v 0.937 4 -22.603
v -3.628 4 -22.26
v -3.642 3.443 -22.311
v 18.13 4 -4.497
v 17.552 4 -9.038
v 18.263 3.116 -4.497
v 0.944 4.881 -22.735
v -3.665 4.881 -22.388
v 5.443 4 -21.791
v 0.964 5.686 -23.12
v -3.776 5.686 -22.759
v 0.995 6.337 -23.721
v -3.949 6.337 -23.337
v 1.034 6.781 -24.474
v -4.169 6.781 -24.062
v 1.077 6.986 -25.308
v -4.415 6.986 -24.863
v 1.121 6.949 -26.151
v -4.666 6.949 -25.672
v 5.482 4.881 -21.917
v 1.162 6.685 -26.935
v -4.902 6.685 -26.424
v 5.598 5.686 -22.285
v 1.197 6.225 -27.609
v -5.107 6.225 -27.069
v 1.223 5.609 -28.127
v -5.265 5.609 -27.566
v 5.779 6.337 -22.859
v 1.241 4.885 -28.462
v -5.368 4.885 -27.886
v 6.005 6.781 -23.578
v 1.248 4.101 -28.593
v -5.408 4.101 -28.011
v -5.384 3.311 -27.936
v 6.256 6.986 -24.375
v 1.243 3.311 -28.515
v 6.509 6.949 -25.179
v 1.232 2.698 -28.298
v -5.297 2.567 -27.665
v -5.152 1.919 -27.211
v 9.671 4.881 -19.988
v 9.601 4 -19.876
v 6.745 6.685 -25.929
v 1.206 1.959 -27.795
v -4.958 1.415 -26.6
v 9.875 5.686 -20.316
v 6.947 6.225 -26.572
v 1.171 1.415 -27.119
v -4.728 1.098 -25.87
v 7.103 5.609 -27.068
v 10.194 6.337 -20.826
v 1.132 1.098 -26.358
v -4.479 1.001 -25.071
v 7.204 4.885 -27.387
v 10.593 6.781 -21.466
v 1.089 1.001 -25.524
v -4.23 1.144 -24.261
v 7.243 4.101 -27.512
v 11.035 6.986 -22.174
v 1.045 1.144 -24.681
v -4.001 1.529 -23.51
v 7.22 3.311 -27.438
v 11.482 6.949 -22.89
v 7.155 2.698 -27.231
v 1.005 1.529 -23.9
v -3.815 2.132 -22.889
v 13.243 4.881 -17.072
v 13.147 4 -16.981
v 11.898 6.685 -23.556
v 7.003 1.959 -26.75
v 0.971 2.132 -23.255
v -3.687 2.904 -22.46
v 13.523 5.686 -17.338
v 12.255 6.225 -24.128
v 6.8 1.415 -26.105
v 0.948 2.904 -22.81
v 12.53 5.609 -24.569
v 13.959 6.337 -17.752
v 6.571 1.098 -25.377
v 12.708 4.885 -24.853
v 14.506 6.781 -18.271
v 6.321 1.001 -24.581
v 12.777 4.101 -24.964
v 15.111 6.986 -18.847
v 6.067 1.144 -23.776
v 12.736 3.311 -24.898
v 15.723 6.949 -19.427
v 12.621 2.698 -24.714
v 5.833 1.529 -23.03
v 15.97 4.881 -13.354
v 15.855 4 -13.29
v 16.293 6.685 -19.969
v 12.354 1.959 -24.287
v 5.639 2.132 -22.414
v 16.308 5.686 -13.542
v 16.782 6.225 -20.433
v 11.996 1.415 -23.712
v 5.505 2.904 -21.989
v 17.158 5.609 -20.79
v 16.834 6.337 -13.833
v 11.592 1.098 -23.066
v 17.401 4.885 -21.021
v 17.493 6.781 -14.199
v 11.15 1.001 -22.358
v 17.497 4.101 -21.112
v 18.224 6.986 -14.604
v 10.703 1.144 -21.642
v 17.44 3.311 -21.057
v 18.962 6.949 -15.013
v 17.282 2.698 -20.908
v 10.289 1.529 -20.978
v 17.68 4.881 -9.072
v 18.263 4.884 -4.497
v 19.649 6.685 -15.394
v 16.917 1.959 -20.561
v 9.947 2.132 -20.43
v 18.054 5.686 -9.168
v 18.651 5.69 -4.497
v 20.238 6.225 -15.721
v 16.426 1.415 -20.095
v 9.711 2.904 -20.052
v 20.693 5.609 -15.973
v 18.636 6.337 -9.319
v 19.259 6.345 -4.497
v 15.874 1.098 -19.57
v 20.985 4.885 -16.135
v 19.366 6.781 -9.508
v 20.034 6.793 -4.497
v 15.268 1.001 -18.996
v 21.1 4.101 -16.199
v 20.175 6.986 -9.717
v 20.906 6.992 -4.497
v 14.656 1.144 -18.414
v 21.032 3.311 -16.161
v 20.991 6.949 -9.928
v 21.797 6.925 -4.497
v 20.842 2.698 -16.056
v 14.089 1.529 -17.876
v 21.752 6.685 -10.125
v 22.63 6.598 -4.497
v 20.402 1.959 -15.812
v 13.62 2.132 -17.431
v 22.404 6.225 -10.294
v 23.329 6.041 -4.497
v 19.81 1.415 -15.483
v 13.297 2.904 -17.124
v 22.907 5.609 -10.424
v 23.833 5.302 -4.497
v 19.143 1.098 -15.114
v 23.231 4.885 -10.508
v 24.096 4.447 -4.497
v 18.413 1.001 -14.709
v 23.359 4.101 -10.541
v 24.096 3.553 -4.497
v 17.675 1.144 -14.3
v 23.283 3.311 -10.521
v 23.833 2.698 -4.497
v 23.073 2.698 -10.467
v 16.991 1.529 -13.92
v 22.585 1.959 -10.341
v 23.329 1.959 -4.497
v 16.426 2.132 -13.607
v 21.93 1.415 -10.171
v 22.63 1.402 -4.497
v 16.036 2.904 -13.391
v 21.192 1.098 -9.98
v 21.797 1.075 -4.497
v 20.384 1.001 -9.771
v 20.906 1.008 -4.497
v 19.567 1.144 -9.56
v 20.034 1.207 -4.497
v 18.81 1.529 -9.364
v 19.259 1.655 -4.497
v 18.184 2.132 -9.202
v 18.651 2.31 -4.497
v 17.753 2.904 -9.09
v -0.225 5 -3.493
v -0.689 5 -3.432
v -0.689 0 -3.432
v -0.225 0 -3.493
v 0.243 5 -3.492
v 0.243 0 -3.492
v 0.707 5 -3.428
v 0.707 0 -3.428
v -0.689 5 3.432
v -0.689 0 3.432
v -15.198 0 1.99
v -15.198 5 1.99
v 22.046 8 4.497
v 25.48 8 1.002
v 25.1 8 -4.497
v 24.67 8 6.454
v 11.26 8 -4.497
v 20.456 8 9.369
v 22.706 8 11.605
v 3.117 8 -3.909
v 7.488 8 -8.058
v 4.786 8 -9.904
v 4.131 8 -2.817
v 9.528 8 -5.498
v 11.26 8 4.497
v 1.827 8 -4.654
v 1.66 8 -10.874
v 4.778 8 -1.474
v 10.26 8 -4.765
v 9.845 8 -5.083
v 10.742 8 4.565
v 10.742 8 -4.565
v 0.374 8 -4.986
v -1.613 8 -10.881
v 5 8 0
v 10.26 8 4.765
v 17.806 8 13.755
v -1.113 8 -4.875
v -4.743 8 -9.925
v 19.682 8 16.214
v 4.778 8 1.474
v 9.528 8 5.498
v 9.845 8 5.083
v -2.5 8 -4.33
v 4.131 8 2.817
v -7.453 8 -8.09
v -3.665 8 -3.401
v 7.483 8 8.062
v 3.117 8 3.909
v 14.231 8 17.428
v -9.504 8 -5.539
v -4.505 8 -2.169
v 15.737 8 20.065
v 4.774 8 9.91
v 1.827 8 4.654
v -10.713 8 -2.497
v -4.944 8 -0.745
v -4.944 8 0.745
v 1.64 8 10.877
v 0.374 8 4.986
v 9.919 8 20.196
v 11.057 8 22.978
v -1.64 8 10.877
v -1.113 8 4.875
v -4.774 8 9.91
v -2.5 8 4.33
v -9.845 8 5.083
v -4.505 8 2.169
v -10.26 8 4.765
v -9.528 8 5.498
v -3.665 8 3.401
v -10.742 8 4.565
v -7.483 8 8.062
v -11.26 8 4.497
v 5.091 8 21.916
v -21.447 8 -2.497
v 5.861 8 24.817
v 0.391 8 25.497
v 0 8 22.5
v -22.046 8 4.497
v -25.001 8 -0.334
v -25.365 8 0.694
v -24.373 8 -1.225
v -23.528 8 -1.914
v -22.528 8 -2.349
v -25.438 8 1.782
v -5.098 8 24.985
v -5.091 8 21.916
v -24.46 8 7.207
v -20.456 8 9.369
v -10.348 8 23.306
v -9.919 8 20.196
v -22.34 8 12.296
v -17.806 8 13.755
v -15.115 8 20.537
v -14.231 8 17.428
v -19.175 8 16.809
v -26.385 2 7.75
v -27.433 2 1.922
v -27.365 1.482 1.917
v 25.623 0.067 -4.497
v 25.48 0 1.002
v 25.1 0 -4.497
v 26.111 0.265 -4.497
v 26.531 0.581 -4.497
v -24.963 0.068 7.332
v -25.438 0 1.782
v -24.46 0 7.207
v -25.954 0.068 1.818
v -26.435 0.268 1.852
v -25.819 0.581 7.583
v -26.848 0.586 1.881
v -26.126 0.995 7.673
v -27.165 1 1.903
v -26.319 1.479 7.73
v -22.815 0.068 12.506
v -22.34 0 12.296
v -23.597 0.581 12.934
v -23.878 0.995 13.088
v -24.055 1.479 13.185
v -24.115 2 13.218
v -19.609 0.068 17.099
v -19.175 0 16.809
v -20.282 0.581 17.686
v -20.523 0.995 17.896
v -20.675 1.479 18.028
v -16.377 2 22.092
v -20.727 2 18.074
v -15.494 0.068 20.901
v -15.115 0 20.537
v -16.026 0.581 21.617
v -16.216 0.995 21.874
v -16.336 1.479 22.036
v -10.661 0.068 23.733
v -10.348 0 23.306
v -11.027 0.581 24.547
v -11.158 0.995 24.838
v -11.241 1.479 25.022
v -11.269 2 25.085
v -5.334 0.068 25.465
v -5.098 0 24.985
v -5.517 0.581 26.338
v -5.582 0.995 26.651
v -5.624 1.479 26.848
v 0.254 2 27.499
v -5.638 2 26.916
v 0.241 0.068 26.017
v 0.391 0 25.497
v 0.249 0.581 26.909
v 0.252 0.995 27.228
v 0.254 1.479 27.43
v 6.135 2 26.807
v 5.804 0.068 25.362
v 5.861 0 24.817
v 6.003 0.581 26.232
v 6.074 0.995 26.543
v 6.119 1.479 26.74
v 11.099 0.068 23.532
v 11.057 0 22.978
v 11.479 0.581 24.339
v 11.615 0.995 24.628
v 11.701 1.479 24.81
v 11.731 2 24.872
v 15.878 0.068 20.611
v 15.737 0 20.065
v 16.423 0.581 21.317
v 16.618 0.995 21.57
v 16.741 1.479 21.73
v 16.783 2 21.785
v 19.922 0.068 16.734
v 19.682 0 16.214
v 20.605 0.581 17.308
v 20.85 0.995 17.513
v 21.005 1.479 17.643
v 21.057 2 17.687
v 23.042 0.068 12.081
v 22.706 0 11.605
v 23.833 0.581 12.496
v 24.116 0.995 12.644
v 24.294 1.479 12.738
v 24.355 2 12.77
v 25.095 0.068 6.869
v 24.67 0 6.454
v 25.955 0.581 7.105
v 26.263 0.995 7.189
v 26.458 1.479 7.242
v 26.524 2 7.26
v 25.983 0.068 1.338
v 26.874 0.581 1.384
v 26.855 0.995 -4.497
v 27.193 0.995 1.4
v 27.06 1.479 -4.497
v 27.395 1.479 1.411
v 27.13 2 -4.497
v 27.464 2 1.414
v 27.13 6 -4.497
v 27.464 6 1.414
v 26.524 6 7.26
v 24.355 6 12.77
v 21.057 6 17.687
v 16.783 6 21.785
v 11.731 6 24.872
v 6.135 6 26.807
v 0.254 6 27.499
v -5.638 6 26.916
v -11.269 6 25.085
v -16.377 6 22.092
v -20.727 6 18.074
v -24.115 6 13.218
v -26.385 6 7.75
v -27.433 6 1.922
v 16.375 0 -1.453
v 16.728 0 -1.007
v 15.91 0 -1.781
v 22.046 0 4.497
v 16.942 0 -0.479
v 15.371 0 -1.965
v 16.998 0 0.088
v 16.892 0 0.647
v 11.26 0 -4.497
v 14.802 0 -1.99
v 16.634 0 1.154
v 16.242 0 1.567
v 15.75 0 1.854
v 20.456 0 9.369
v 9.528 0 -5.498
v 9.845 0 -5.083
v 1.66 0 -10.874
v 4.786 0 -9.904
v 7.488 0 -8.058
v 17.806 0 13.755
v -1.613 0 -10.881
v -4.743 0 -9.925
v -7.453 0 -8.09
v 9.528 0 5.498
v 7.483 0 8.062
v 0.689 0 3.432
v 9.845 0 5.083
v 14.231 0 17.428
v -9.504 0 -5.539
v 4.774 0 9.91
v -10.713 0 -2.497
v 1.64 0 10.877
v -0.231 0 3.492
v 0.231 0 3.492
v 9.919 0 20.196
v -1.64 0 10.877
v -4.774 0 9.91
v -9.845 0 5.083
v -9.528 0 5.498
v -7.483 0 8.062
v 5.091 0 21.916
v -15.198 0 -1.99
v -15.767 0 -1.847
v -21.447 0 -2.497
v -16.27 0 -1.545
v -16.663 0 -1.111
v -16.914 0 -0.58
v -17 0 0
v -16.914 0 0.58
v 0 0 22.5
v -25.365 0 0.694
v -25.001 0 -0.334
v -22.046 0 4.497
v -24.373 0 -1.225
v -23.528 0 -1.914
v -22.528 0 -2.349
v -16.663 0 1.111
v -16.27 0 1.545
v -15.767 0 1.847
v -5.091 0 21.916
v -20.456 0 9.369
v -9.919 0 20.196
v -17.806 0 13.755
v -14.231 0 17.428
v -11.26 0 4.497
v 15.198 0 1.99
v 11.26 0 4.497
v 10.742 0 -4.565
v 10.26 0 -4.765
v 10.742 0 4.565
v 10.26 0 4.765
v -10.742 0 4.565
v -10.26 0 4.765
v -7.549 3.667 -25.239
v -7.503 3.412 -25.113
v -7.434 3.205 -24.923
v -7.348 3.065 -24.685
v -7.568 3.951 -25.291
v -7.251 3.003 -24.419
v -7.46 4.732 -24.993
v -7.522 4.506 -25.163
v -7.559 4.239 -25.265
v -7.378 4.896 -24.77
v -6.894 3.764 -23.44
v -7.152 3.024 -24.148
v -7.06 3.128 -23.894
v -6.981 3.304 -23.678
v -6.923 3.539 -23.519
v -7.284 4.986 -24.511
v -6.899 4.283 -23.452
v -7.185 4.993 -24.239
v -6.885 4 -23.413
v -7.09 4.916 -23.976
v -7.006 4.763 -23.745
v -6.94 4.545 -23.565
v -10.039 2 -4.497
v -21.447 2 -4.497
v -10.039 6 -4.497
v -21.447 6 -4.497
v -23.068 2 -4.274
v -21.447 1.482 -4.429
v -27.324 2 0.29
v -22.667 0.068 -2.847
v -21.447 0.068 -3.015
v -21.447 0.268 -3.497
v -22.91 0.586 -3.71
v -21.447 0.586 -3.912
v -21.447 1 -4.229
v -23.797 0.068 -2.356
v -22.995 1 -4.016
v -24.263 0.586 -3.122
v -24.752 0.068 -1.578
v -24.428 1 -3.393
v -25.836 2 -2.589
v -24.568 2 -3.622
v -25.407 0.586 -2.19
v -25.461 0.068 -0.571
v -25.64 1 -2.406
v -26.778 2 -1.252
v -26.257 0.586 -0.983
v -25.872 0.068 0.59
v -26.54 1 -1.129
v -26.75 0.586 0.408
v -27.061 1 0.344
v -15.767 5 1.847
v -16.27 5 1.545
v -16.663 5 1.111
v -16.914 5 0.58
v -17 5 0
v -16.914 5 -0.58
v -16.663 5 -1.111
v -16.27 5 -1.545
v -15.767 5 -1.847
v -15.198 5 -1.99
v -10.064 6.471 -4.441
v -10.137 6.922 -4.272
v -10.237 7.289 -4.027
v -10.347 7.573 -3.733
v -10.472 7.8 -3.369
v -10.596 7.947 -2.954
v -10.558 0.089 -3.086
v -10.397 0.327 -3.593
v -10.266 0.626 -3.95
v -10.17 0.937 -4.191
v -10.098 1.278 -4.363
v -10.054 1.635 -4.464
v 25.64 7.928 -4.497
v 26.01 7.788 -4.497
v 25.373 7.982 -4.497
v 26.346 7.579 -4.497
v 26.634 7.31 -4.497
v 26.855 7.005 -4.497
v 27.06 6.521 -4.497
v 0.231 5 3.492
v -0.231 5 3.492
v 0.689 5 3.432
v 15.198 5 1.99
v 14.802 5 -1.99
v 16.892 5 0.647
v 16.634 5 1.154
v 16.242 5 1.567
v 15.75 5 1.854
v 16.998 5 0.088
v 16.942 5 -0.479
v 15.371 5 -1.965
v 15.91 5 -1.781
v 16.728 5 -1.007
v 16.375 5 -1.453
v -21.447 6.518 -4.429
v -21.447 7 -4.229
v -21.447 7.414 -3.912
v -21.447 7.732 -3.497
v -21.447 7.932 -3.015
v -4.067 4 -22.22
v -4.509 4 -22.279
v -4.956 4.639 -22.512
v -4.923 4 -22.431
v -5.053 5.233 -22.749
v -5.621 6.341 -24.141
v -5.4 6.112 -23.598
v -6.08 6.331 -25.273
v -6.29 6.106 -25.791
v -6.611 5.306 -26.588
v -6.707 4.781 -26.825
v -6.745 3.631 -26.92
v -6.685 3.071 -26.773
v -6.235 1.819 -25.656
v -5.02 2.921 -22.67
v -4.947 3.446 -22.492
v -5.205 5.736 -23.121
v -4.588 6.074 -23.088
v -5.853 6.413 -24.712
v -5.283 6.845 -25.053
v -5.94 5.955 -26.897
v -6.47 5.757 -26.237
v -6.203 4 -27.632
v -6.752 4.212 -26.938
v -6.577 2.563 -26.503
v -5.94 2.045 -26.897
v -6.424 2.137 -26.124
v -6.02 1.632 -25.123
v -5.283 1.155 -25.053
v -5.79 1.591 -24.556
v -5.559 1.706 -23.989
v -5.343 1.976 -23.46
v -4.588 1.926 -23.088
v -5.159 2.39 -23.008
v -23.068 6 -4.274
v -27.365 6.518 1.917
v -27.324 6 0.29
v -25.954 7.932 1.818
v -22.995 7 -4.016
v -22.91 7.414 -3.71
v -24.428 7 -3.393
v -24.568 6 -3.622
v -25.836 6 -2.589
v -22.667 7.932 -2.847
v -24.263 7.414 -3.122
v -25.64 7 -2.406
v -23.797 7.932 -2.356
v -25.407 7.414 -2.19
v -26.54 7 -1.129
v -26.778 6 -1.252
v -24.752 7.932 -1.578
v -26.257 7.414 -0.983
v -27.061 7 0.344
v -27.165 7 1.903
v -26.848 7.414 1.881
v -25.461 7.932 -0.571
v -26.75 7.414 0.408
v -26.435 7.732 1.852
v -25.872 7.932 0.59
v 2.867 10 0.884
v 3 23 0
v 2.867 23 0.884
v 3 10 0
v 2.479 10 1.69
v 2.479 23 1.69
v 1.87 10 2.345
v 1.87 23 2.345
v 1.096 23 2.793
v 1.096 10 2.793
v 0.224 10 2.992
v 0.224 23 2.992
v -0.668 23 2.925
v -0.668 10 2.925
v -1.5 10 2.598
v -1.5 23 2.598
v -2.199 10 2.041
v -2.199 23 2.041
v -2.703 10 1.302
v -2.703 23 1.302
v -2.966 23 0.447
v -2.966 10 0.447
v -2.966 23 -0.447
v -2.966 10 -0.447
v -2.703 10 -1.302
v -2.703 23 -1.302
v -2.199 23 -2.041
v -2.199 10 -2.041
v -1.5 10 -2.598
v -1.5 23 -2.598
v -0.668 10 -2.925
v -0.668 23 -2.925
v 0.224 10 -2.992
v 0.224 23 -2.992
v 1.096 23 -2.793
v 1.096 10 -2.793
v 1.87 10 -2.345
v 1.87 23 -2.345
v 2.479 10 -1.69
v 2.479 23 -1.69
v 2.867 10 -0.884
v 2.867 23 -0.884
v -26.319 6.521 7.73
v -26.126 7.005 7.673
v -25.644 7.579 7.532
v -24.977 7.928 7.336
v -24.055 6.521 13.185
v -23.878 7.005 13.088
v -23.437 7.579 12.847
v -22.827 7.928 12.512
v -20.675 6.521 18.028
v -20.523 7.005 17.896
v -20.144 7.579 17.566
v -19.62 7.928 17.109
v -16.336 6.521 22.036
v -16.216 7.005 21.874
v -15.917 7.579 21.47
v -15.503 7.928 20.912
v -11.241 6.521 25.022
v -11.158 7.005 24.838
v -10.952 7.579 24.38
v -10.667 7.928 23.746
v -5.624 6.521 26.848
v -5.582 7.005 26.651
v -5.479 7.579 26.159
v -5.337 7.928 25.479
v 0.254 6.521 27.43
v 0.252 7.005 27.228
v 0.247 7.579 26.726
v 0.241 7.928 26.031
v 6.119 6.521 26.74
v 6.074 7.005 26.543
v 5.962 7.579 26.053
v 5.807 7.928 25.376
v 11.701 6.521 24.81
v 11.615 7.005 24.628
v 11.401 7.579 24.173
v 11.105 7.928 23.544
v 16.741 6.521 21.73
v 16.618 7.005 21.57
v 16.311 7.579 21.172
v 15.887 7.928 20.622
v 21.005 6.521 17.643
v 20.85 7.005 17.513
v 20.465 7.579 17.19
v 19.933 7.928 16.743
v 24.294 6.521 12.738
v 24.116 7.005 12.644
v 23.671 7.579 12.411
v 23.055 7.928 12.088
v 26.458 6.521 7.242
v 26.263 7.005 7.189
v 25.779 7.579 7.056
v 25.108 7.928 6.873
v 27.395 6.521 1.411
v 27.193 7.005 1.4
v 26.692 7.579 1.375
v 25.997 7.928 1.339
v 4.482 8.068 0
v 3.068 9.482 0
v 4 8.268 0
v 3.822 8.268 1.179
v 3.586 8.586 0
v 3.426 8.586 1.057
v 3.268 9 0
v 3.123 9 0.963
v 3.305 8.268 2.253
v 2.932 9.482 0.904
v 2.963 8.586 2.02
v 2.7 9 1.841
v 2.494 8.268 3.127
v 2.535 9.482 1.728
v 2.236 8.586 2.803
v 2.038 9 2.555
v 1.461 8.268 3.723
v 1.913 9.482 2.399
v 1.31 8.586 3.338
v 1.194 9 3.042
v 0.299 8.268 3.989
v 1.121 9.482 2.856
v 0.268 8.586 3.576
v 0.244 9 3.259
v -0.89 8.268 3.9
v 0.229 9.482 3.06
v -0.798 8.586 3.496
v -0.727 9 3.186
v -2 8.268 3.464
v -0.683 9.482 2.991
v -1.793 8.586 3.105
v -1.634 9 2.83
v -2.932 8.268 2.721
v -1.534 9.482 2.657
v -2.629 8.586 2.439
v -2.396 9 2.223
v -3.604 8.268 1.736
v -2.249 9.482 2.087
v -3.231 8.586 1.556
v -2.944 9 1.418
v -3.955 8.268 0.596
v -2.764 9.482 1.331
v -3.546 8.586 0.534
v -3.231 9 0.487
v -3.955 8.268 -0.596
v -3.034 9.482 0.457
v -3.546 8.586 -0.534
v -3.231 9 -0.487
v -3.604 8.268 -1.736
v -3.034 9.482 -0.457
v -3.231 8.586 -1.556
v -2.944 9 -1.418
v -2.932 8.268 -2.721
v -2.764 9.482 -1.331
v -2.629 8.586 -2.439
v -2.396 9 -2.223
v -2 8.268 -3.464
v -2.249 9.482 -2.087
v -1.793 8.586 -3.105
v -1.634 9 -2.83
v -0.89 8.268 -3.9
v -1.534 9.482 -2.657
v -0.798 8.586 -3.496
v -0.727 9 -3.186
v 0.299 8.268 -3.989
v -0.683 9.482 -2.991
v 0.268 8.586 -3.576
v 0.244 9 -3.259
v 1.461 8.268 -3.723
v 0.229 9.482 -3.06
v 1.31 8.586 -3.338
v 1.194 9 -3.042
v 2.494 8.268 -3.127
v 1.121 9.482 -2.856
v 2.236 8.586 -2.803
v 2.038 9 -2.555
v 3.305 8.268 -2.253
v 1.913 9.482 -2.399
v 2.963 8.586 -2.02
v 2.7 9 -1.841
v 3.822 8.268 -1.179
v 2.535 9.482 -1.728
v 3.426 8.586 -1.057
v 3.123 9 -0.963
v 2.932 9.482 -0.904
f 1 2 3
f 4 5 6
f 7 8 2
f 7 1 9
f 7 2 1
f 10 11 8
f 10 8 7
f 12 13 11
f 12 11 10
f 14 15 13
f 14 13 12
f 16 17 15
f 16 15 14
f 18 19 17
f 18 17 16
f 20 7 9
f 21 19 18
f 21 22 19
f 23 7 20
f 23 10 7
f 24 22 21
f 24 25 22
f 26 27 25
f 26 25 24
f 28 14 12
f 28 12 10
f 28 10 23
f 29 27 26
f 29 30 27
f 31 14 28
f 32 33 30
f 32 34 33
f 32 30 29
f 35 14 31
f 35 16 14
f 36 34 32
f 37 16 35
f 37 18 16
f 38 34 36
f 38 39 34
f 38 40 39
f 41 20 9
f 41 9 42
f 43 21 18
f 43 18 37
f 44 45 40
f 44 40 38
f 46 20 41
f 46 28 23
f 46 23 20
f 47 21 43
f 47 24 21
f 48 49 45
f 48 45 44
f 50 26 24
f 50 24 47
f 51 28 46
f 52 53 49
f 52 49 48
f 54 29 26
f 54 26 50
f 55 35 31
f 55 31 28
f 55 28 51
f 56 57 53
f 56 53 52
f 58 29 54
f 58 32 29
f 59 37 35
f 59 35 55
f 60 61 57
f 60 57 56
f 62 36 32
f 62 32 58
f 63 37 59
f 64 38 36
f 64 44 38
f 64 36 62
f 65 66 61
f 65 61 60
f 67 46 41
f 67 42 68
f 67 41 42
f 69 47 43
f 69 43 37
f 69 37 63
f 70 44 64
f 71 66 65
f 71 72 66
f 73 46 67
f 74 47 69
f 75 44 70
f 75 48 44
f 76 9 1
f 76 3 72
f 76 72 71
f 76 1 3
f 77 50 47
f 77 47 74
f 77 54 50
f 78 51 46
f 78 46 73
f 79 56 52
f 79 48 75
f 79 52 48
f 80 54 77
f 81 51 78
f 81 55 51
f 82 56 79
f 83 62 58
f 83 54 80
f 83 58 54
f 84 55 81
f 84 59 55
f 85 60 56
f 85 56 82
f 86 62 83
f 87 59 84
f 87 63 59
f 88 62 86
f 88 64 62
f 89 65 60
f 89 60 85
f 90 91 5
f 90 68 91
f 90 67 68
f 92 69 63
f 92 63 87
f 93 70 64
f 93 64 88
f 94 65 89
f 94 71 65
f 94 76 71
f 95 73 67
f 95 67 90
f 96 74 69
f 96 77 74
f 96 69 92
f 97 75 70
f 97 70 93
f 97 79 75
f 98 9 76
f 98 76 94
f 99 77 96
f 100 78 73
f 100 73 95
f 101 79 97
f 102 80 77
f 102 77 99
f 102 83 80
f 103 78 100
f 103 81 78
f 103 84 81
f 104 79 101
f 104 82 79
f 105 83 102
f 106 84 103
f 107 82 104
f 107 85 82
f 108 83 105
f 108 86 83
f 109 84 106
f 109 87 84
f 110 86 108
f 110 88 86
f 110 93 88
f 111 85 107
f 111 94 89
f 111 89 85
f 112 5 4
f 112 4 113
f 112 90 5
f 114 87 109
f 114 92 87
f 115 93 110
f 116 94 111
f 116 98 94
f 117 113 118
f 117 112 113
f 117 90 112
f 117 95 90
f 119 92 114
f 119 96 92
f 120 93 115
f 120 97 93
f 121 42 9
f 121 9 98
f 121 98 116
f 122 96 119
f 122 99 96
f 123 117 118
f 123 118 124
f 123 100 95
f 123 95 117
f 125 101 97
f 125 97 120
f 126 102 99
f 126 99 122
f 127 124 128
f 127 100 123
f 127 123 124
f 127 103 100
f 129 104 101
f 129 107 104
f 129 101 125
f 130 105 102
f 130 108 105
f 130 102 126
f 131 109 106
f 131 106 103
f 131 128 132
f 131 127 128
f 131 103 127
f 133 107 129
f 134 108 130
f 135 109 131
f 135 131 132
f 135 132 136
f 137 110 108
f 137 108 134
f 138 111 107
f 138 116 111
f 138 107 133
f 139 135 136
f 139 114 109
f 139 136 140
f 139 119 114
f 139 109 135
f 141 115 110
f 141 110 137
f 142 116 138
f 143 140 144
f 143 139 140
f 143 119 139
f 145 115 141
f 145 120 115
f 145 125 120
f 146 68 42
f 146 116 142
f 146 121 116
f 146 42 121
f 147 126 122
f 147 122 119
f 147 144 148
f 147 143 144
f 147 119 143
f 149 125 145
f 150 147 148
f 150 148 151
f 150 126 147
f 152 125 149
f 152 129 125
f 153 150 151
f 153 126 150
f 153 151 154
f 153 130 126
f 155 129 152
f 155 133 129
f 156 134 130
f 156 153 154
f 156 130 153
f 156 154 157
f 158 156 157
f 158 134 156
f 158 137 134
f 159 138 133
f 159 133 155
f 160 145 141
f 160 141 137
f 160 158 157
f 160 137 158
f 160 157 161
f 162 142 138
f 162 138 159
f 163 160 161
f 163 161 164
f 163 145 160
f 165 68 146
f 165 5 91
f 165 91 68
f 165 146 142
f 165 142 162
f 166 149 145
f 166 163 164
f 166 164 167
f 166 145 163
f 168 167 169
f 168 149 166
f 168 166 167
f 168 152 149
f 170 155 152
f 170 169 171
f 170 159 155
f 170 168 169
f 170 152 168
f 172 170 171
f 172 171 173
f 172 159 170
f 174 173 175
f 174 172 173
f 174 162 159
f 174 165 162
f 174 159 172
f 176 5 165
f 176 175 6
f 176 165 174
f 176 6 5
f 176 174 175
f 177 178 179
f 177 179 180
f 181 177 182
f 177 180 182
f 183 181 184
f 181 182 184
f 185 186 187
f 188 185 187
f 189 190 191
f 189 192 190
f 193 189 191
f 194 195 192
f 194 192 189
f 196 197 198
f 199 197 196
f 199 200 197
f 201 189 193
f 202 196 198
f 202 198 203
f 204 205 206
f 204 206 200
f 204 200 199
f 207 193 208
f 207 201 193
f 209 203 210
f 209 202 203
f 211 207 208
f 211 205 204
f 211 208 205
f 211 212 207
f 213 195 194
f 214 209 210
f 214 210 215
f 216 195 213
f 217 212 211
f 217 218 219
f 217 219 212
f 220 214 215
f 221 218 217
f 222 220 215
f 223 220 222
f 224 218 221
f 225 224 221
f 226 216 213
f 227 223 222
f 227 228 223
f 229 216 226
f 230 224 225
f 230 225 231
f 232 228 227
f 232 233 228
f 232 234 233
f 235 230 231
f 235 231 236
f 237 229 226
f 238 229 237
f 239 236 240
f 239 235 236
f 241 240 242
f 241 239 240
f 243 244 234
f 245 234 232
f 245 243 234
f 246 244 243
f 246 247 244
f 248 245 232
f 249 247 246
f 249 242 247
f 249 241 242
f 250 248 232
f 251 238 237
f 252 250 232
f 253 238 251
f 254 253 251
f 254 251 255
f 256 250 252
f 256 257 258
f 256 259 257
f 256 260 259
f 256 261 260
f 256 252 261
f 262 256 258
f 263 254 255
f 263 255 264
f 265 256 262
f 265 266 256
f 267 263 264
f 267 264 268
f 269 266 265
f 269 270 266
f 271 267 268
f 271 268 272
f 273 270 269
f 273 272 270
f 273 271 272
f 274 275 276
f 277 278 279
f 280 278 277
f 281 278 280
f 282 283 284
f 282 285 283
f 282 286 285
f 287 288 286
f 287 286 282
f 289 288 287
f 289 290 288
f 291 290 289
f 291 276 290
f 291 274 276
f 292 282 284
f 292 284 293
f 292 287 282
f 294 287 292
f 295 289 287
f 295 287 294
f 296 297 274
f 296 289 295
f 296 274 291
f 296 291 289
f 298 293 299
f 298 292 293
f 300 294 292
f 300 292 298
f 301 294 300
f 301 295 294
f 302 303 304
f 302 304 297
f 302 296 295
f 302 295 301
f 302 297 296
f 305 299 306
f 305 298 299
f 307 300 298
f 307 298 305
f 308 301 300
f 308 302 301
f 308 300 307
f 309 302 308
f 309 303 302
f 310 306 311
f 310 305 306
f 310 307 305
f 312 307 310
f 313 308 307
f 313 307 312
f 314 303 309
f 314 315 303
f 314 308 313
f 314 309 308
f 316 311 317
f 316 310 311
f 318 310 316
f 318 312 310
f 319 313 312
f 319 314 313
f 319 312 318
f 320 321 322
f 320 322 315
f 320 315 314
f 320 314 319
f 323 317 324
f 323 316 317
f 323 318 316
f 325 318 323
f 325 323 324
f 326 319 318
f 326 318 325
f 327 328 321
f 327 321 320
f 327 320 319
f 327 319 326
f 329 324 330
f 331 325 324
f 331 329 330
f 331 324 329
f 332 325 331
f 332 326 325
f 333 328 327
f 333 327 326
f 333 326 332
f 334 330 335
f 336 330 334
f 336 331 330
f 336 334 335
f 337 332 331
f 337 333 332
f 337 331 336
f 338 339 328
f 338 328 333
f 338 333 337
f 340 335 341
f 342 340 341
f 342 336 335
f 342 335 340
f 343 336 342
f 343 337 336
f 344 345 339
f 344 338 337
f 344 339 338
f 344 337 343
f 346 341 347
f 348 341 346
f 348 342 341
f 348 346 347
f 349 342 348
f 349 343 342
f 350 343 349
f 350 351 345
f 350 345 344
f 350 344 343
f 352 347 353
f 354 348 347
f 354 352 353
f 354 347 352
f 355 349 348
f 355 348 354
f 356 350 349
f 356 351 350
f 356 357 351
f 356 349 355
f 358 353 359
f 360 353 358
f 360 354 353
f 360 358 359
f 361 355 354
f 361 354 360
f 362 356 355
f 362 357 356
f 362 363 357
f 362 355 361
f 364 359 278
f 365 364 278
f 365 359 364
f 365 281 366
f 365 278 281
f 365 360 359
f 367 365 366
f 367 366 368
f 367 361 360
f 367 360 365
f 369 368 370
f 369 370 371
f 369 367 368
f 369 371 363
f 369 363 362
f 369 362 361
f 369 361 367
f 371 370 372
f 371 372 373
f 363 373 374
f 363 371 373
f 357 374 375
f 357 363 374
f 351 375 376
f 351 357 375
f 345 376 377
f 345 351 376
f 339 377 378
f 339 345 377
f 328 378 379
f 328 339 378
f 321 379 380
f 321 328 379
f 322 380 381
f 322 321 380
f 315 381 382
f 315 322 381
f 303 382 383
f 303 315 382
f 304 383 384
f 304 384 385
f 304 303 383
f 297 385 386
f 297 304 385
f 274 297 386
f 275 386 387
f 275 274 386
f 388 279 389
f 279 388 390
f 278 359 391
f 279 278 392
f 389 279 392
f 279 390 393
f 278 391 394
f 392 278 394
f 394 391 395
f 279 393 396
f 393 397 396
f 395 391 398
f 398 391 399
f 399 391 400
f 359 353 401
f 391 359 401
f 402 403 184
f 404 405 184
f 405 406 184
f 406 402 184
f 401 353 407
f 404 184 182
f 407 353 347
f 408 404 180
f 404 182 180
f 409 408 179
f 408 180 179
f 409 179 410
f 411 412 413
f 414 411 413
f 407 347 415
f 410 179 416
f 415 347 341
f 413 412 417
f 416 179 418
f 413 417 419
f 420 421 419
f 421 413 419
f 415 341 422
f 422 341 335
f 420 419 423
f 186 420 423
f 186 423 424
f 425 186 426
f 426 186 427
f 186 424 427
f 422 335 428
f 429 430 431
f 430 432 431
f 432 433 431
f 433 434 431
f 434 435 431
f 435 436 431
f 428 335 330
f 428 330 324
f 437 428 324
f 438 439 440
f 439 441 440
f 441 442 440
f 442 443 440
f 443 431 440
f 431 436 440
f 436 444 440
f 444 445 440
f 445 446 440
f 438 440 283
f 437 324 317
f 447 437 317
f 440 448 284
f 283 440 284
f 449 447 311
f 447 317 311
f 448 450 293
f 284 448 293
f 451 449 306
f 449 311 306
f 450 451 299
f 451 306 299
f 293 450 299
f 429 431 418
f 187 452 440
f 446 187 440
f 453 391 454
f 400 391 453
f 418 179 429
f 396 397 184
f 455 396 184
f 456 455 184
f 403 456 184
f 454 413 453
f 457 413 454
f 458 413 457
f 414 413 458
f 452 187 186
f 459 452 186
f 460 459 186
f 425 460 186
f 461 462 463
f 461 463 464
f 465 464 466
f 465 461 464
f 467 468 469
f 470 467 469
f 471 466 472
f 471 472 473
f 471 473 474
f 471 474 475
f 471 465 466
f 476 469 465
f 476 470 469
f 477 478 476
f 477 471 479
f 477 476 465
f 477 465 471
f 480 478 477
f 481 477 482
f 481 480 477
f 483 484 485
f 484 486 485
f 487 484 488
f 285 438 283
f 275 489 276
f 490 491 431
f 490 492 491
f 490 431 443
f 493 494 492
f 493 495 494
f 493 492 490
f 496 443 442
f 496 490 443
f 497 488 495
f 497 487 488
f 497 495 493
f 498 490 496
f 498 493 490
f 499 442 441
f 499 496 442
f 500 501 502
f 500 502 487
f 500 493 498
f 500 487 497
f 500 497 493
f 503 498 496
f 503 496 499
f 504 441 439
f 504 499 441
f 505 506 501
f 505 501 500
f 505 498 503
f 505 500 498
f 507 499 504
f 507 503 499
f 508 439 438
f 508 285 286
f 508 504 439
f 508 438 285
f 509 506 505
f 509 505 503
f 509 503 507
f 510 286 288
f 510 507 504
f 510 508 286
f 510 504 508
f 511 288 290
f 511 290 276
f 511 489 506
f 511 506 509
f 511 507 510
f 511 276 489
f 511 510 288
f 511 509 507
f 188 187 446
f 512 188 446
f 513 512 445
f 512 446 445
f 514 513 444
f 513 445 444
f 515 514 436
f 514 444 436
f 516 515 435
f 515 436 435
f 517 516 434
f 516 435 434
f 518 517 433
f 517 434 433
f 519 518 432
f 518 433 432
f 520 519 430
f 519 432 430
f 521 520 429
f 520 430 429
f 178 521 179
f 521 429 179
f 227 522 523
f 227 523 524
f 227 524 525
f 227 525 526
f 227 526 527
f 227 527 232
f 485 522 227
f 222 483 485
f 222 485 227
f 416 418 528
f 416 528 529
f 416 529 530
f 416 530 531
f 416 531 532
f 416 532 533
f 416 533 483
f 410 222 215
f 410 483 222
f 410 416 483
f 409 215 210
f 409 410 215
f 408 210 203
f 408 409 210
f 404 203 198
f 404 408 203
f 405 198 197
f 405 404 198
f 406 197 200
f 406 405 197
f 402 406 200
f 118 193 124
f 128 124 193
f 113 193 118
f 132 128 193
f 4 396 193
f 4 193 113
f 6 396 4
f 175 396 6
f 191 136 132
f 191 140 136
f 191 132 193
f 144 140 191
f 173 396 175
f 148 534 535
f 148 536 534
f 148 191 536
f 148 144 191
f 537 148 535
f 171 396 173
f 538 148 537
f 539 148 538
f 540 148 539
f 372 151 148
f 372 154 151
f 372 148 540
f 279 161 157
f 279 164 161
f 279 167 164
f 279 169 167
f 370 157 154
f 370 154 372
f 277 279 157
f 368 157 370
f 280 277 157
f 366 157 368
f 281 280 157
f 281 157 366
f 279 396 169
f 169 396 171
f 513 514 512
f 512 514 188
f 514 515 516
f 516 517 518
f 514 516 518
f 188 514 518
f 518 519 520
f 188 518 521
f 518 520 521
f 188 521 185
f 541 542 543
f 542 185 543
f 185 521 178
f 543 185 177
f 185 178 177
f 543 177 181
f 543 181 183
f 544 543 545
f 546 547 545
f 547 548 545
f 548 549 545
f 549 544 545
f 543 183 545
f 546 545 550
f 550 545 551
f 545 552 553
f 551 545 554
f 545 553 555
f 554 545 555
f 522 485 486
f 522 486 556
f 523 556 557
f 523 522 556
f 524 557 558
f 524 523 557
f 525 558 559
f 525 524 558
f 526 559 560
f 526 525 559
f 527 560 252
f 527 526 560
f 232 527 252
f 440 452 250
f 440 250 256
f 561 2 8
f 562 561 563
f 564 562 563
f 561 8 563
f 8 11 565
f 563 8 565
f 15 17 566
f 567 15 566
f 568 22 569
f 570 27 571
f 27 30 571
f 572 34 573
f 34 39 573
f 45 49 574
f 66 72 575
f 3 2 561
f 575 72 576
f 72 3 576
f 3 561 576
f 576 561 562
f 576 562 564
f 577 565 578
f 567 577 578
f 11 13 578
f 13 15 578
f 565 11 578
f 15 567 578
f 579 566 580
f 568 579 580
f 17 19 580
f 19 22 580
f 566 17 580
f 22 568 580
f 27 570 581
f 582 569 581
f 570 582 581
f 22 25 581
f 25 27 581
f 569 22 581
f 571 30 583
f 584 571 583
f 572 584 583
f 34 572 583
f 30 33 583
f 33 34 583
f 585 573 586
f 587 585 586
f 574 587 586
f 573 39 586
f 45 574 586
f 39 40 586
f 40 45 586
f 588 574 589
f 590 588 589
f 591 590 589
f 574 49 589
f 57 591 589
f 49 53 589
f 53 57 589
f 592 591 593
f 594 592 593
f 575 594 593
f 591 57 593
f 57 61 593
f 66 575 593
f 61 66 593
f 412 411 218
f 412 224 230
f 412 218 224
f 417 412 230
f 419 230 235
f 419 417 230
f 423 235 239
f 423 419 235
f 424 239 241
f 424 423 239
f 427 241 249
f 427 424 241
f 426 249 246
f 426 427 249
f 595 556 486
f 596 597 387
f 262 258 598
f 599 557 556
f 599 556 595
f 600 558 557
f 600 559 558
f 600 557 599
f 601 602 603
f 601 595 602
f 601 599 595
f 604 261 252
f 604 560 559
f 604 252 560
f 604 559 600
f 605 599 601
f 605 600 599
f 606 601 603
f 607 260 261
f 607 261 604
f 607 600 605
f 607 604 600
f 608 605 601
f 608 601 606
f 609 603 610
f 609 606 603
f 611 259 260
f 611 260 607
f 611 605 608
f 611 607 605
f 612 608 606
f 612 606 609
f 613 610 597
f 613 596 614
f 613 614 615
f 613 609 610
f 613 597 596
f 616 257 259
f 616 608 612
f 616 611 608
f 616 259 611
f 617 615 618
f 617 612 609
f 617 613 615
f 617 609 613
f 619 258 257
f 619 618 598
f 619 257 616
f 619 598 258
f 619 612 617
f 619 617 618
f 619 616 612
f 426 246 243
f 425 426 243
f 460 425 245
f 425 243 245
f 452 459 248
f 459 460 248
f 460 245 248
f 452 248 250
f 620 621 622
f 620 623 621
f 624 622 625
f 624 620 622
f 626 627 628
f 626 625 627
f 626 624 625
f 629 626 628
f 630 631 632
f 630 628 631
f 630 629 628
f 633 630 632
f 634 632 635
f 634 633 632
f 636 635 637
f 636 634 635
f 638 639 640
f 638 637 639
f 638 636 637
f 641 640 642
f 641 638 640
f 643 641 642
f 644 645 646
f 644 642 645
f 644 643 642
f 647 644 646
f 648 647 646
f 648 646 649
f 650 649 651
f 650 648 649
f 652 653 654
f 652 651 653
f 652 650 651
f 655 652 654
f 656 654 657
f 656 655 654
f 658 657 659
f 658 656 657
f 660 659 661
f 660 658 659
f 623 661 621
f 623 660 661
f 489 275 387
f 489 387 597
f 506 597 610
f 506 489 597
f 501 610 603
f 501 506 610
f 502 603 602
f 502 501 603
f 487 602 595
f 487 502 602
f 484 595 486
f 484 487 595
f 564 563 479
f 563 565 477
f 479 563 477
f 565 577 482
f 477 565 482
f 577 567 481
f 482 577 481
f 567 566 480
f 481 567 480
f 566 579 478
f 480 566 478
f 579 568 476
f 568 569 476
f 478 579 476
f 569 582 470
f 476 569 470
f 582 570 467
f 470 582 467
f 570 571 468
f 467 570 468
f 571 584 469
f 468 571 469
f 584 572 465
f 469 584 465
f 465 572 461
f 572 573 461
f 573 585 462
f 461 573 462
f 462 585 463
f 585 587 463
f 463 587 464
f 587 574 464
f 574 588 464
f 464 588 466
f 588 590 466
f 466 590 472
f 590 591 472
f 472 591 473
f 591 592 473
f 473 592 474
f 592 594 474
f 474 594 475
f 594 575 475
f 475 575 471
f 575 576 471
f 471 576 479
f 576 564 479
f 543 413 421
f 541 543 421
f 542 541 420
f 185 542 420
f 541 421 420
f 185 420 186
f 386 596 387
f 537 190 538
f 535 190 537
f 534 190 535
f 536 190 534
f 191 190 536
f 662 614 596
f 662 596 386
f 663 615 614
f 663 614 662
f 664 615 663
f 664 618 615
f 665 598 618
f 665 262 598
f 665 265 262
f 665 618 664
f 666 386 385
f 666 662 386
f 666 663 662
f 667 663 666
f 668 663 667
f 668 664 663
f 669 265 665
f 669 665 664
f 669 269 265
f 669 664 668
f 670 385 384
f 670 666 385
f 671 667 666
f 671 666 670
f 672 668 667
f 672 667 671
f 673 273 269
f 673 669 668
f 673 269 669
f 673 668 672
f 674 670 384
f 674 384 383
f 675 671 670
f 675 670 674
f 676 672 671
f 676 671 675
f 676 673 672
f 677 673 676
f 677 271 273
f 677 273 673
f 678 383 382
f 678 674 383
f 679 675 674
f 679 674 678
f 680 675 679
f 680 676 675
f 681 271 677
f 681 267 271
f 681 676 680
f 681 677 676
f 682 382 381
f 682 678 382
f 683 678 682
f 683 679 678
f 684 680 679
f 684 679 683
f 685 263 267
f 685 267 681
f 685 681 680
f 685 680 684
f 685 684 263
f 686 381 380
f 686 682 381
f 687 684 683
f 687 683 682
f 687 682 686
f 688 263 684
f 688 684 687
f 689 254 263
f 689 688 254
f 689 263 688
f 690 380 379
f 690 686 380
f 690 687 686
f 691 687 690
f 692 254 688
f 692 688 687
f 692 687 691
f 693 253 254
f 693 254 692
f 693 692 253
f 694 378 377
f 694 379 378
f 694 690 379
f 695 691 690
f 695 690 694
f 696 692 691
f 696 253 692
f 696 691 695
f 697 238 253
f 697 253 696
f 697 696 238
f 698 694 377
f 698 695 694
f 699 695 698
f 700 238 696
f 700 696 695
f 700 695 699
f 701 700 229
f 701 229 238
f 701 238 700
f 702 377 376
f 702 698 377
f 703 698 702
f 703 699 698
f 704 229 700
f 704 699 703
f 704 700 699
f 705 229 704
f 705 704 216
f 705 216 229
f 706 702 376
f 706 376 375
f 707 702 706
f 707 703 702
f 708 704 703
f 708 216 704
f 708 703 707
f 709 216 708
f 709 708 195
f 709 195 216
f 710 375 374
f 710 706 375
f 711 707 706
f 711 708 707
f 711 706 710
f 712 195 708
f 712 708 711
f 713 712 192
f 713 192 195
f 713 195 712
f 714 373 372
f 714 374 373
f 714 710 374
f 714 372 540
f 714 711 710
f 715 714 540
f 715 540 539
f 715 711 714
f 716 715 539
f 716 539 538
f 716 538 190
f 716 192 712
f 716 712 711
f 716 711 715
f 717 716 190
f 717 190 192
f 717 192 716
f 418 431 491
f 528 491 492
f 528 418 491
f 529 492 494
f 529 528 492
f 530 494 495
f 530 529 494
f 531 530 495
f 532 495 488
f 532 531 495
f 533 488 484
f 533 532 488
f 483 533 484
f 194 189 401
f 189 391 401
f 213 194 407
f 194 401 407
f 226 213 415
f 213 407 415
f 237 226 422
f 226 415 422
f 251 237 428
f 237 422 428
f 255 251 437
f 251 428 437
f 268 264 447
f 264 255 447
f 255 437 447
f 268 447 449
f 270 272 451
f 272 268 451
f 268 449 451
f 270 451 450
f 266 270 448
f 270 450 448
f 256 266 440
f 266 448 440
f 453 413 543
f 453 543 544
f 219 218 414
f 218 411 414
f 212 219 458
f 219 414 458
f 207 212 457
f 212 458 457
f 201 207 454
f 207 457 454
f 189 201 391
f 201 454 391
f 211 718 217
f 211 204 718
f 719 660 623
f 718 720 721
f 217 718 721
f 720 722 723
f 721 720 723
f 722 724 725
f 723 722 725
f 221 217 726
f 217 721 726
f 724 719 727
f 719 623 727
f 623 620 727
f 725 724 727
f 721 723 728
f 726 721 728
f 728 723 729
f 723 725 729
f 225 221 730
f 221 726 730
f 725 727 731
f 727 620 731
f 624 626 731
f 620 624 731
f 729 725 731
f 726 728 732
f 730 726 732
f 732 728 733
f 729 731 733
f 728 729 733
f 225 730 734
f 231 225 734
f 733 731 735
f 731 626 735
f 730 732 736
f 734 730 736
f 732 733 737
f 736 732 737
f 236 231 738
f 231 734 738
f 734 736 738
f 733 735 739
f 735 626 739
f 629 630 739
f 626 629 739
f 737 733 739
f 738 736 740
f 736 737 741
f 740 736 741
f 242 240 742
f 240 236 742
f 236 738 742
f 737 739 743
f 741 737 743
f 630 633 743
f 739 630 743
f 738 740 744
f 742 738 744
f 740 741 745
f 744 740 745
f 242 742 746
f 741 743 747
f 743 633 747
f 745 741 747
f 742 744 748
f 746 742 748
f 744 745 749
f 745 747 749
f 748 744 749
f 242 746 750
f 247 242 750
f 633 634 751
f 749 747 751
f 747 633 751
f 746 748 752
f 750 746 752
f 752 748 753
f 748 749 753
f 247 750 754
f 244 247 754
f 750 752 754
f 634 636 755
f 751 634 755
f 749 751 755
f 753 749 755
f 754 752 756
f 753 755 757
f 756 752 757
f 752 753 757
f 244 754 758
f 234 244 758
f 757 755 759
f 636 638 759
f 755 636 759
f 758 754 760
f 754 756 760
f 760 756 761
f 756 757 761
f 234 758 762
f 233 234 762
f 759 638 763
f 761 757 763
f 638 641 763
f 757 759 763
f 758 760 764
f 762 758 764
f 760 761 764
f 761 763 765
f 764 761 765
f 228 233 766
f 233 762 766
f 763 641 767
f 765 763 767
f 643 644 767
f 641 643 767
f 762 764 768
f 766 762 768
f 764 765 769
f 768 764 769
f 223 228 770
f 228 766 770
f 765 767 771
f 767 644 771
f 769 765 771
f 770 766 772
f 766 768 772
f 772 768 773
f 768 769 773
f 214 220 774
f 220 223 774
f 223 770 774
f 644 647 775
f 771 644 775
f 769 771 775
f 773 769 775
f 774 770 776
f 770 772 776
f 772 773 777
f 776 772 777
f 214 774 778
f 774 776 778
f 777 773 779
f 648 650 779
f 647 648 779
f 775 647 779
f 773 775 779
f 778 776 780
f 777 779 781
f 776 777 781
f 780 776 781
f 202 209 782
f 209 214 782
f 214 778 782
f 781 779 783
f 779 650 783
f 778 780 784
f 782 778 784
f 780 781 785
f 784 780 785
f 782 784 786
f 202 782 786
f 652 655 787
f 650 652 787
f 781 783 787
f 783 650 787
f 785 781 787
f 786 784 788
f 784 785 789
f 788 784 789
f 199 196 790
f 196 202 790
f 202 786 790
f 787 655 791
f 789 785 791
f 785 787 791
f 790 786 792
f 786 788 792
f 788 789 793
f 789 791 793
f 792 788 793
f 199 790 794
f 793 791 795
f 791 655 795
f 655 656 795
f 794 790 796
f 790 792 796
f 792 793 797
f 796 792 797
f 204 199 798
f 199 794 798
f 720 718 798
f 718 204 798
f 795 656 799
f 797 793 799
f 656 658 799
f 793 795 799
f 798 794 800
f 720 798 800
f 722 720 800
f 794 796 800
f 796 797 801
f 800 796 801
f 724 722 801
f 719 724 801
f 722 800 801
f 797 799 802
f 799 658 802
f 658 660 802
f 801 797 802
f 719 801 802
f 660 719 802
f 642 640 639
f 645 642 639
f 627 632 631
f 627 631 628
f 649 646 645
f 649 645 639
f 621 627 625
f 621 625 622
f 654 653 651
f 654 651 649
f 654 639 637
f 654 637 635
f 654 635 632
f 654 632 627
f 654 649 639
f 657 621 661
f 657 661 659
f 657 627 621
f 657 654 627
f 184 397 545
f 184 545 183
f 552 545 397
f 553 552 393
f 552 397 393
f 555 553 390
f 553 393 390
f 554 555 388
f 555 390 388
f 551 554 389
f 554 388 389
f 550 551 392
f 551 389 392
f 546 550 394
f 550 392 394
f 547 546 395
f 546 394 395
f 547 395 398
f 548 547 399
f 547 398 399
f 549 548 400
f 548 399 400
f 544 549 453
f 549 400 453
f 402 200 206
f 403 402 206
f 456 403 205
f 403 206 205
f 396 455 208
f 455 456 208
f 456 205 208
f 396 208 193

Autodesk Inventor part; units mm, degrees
ref_plane "YZ Plane" through (0, 0, 0) normal (1, 0, 0) x (0, 1, 0)
ref_plane "XZ Plane" through (0, 0, 0) normal (0, 1, 0) x (-1, 0, 0)
ref_plane "XY Plane" through (0, 0, 0) normal (0, 0, 1) x (1, 0, 0)
sketch "Skizze1" plane through (0, 0, 0) normal (0, 1, 0) x (-1, 0, 0)
  circle A0 centre (0, 0) radius 27.5
  circle A1 centre (0, 0) radius 22.5
  circle A2 centre (0, 0) radius 3.5
  line L0 (45.7225, 0) -> (-63.662, 0) construction
  line L1 (0, 78.2374) -> (0, -78.2374) construction
  circle A3 centre (15, 0) radius 2
  circle A4 centre (-15, 0) radius 2
  line L2 (0, 3.5) -> (15.1977, 1.9902)
  line L3 (15.1977, -1.9902) -> (0, -3.5)
  line L4 (-14.8023, -1.9902) -> (0, -3.5)
  line L5 (0, 3.5) -> (-15.1977, 1.9902)
  circle A5 centre (0, 0) radius 11
  line L6 (10.0387, 4.4973) -> (22.046, 4.4973)
  line L7 (-10.0387, 4.4973) -> (-22.046, 4.4973)
  line L8 (10.0387, -4.4973) -> (22.046, -4.4973)
  line L9 (-10.0387, -4.4973) -> (-22.046, -4.4973)
  point P0 (27.1298, 4.4973)
  point P1 (-27.023, -5.1)
  point P2 (13.75, -23.8157)
  point P3 (-13.75, 23.8157)
  point P4 (-0.6886, 3.4316)
  point P5 (0.6886, 3.4316)
  point P6 (0.6886, -3.4316)
  point P7 (-0.7066, -3.4279)
  dimension "d0" = 55
  dimension "d1" = 45
  dimension "d2" = 7
  dimension "d3" = 4
  dimension "d4" = 4
  dimension "d5" = 15
  dimension "d6" = 22
ref_plane "Arbeitsebene1" through (0, 3.7, 0) normal (0, 1, 0) x (1, 0, 0)
extrude "Extrusion3" add sketch "Skizze1" along normal blind 8 contours A0 | A1 L8 A5 L3 A3 L2 L6 | L7 A5 L5 A4 L4 L9 A1 | A5 L2 A2 L5 | A5 L4 A2 L3
sketch "Skizze3" plane through (0, 8, 0) normal (0, 1, 0) x (1, 0, 0)
  arc A0 (22.046, 4.4973) -> (-22.046, 4.4973) centre (0, 0) ccw projected
  arc A1 (-22.046, -4.4973) -> (22.046, -4.4973) centre (0, 0) ccw projected
  line L0 (-22.046, 4.4973) -> (22.046, 4.4973)
  line L1 (22.046, 4.4973) -> (22.046, -4.4973)
  line L2 (22.046, -4.4973) -> (-22.046, -4.4973)
  line L3 (-22.046, -4.4973) -> (-22.046, 4.4973)
extrude "Extrusion4" add sketch "Skizze3" against normal blind 3 contours L1 L2 L3 L0
sketch "Skizze7" plane through (0, 8, 0) normal (0, 1, 0) x (1, 0, 0)
  arc A0 (22.046, 4.4973) -> (-22.046, 4.4973) centre (0, 0) ccw projected
  line L0 (-22.046, 4.4973) -> (-27.1298, 4.4973)
  circle A1 centre (0, 0) radius 27.5 projected
  line L1 (22.046, 4.4973) -> (10.0387, 4.4973) projected
  line L2 (22.046, 4.4973) -> (27.1412, 4.4973)
  line L3 (27.1412, 4.4973) -> (9.9712, 4.4973)
  arc A2 (10.0387, 4.4973) -> (-10.0387, 4.4973) centre (0, 0) ccw projected
  line L4 (-22.046, 4.4973) -> (-10.0387, 4.4973)
  circle A3 centre (0, 0) radius 11
  circle A4 centre (0, 0) radius 27.5
  point P0 (27.1298, 4.4973)
extrude "Extrusion8" cut sketch "Skizze7" against normal blind 10 contours L1 A2 L4 A0 | A0 L0 A1 L2
sketch "Skizze8" plane through (27.1298, 0, -4.4973) normal (0, 0, -1) x (-1, 0, 0)
  circle A0 centre (6, 4) radius 3
  line L0 (-1.9792, 4) -> (11.3711, 4) construction
  line L1 (0, 8) -> (17.0911, 8) construction
  line L2 (6, -1.8512) -> (6, 10.0367) construction
  line L3 (0, 0) -> (0, 8) construction
  line L4 (27.1298, -4.2288) -> (27.1298, 12.4142) projected
  point P0 (27.1298, 0)
  dimension "d37" = 4
  dimension "d38" = 6
  dimension "d39" = 6
revolve "Umdrehung1" add sketch "Skizze8" angle 110 about axis through (0, -10, -4.4973) along (0, 1, 0)
chamfer "Fase1" distance 2 angle 45 1 edges at (-8.2529, 4, -27.1718)
fillet "Rundung7" radius 2 1 edges at (-6.3467, 4, -27.7774)
fillet "Rundung8" radius 6 1 edges at (-27.1298, 4, -4.4973)
fillet "Rundung9" radius 2 6 edges at (-25.8358, 0, -2.589) (-15.743, 0, -4.4973) (3.2133, 0, 27.3116) (-25.8358, 8, -2.589) (-15.743, 8, -4.4973) (3.2133, 8, 27.3116)
sketch "Skizze9" plane through (0, 8, 0) normal (0, 1, 0) x (1, 0, 0)
  circle A0 centre (0, 0) radius 3
  dimension "d47" = 6
extrude "Extrusion9" add sketch "Skizze9" along normal blind 15
fillet "Rundung10" radius 2 3 edges at (10.0387, 4, 4.4973) (10.0387, 4, -4.4973) (-10.0387, 4, 4.4973)
fillet "Rundung11" radius 2 1 edges at (-3, 8, 0)
properties part number "_3D-Druck"
